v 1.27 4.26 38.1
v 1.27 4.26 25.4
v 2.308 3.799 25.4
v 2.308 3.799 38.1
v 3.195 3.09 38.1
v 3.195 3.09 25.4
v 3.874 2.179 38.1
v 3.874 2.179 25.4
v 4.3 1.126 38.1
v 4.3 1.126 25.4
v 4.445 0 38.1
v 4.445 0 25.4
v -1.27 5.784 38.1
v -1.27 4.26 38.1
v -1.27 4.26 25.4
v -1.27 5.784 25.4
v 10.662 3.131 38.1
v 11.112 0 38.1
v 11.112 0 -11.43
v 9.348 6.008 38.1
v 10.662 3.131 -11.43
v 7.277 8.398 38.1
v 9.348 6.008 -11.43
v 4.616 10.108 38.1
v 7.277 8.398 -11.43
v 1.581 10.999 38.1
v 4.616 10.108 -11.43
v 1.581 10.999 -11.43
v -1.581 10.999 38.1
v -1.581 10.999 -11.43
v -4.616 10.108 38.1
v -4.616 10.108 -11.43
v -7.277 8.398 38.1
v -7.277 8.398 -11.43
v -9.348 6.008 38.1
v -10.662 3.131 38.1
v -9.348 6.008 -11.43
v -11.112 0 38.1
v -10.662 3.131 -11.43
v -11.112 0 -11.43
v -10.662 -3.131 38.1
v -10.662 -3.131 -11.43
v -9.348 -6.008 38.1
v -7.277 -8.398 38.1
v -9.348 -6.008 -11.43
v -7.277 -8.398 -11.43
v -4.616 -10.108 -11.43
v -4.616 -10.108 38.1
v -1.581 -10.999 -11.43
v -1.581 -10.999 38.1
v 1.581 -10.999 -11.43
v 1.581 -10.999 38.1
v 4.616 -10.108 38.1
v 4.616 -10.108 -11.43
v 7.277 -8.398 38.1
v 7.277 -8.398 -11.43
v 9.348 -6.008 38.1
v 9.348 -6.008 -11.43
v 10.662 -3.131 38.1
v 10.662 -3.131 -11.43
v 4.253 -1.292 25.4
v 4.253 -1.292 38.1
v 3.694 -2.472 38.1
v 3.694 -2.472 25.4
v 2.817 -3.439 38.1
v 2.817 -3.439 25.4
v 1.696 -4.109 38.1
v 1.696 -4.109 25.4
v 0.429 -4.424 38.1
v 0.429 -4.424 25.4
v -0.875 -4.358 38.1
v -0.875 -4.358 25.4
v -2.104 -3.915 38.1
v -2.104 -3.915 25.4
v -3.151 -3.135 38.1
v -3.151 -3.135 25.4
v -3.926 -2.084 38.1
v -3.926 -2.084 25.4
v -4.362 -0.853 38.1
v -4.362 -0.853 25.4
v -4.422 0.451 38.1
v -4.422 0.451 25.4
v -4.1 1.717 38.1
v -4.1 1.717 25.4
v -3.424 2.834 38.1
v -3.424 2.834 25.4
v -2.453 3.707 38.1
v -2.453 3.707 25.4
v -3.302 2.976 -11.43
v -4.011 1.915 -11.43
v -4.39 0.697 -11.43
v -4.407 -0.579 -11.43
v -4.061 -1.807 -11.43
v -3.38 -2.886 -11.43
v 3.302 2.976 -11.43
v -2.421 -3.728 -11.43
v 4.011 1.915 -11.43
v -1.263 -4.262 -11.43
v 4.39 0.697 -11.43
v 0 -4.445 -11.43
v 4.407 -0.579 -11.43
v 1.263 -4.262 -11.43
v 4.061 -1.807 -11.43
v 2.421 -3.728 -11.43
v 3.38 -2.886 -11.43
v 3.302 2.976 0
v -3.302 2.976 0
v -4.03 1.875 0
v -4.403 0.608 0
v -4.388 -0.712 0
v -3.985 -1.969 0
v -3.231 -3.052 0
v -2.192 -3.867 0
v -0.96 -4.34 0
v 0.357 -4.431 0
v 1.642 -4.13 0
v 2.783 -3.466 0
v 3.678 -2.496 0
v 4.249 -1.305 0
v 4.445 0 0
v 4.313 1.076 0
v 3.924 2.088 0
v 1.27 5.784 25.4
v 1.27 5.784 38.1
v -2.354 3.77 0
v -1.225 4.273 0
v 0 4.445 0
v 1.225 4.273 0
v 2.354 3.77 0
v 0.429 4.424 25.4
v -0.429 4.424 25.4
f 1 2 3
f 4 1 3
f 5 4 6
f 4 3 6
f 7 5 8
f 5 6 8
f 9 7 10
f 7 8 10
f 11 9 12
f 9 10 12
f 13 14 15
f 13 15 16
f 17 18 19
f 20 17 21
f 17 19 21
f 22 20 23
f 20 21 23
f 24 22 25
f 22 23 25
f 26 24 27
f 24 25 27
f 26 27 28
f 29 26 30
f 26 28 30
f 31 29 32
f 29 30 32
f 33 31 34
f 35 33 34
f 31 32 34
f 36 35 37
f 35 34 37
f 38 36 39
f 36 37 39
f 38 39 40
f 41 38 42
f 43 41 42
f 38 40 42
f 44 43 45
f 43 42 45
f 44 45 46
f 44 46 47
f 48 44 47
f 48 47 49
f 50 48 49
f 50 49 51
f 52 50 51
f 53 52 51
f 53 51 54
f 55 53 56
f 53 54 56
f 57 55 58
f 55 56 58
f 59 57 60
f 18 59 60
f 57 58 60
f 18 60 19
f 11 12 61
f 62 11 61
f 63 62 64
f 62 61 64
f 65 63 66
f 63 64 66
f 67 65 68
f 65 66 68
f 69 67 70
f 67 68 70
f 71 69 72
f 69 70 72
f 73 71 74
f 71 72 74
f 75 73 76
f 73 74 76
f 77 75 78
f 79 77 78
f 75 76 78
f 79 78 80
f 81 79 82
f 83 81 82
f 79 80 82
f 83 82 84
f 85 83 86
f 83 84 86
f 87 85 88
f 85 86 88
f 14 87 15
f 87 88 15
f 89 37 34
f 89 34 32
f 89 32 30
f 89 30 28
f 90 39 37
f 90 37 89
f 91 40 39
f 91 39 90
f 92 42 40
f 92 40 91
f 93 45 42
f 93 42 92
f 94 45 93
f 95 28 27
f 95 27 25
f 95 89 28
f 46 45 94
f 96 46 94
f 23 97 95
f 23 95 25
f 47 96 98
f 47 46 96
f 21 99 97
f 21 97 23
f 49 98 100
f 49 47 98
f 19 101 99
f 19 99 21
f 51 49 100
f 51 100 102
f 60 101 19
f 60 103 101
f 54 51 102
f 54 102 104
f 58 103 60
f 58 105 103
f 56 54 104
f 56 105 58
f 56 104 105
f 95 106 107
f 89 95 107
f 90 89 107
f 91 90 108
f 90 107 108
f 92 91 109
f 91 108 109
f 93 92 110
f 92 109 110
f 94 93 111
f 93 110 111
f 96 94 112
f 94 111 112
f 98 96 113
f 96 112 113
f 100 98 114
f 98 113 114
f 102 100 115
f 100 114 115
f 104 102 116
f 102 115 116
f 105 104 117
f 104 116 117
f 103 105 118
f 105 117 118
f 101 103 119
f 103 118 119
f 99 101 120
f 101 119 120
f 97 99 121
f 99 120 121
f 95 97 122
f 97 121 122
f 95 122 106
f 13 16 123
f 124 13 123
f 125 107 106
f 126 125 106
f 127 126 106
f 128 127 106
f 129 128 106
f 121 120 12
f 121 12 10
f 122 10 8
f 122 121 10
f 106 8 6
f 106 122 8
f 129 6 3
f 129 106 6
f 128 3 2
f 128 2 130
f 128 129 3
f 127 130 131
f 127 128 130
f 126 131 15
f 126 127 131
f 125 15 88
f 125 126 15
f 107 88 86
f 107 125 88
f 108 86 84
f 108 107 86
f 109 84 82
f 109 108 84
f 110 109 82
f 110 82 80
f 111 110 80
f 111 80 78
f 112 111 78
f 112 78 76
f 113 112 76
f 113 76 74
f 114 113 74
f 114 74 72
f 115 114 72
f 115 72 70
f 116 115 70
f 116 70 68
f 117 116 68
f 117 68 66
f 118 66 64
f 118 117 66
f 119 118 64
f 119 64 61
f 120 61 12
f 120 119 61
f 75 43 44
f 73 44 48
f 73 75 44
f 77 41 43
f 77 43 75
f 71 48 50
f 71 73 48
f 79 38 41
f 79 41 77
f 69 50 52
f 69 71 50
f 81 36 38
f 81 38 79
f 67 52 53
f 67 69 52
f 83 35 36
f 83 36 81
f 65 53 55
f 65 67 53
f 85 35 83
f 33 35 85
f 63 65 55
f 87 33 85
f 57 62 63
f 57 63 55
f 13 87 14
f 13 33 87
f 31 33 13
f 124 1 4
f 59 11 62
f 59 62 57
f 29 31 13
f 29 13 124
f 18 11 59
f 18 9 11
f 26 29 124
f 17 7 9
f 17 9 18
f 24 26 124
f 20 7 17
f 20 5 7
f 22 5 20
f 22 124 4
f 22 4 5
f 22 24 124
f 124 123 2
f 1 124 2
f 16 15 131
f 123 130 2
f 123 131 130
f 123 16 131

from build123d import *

# Parameters (mm, degrees)
F0_R     = 11.1125
F0_R_2   = 4.445
F1_DEPTH = 25.4
F2_R     = 11.1125
F3_DEPTH = 11.43
F4_R     = 11.1125
F5_DEPTH = 12.7


with BuildPart() as f1:
    # F0 (on Top) → F1 (new body)
    with BuildSketch(Plane.XY):
        Circle(F0_R)
        Circle(F0_R_2, mode=Mode.SUBTRACT)
    extrude(amount=F1_DEPTH)

    # F2 (on face) → F3 (join)
    with BuildSketch(Plane(origin=(0, 0, 0), x_dir=(1, 0, 0), z_dir=(0, 0, -1))):
        Circle(F2_R)
        with BuildLine():
            ThreePointArc((-3.302, -2.975705), (0, 4.445), (3.302, -2.975705))
            Line((3.302, -2.975705), (-3.302, -2.975705))
        make_face(mode=Mode.SUBTRACT)
    extrude(amount=F3_DEPTH)

    # F4 (on face) → F5 (join)
    with BuildSketch(Plane.XY.offset(25.4)):
        Circle(F4_R)
        with BuildLine():
            ThreePointArc((4.445, 0), (-2.656396, -3.563929), (-1.27, 4.259709))
            Line((-1.27, 4.259709), (-1.27, 5.783709))
            Line((-1.27, 5.783709), (1.27, 5.783709))
            Line((1.27, 5.783709), (1.27, 4.259709))
            ThreePointArc((1.27, 4.259709), (3.563929, 2.656396), (4.445, 0))
        make_face(mode=Mode.SUBTRACT)
    extrude(amount=F5_DEPTH)


solid = f1.part
